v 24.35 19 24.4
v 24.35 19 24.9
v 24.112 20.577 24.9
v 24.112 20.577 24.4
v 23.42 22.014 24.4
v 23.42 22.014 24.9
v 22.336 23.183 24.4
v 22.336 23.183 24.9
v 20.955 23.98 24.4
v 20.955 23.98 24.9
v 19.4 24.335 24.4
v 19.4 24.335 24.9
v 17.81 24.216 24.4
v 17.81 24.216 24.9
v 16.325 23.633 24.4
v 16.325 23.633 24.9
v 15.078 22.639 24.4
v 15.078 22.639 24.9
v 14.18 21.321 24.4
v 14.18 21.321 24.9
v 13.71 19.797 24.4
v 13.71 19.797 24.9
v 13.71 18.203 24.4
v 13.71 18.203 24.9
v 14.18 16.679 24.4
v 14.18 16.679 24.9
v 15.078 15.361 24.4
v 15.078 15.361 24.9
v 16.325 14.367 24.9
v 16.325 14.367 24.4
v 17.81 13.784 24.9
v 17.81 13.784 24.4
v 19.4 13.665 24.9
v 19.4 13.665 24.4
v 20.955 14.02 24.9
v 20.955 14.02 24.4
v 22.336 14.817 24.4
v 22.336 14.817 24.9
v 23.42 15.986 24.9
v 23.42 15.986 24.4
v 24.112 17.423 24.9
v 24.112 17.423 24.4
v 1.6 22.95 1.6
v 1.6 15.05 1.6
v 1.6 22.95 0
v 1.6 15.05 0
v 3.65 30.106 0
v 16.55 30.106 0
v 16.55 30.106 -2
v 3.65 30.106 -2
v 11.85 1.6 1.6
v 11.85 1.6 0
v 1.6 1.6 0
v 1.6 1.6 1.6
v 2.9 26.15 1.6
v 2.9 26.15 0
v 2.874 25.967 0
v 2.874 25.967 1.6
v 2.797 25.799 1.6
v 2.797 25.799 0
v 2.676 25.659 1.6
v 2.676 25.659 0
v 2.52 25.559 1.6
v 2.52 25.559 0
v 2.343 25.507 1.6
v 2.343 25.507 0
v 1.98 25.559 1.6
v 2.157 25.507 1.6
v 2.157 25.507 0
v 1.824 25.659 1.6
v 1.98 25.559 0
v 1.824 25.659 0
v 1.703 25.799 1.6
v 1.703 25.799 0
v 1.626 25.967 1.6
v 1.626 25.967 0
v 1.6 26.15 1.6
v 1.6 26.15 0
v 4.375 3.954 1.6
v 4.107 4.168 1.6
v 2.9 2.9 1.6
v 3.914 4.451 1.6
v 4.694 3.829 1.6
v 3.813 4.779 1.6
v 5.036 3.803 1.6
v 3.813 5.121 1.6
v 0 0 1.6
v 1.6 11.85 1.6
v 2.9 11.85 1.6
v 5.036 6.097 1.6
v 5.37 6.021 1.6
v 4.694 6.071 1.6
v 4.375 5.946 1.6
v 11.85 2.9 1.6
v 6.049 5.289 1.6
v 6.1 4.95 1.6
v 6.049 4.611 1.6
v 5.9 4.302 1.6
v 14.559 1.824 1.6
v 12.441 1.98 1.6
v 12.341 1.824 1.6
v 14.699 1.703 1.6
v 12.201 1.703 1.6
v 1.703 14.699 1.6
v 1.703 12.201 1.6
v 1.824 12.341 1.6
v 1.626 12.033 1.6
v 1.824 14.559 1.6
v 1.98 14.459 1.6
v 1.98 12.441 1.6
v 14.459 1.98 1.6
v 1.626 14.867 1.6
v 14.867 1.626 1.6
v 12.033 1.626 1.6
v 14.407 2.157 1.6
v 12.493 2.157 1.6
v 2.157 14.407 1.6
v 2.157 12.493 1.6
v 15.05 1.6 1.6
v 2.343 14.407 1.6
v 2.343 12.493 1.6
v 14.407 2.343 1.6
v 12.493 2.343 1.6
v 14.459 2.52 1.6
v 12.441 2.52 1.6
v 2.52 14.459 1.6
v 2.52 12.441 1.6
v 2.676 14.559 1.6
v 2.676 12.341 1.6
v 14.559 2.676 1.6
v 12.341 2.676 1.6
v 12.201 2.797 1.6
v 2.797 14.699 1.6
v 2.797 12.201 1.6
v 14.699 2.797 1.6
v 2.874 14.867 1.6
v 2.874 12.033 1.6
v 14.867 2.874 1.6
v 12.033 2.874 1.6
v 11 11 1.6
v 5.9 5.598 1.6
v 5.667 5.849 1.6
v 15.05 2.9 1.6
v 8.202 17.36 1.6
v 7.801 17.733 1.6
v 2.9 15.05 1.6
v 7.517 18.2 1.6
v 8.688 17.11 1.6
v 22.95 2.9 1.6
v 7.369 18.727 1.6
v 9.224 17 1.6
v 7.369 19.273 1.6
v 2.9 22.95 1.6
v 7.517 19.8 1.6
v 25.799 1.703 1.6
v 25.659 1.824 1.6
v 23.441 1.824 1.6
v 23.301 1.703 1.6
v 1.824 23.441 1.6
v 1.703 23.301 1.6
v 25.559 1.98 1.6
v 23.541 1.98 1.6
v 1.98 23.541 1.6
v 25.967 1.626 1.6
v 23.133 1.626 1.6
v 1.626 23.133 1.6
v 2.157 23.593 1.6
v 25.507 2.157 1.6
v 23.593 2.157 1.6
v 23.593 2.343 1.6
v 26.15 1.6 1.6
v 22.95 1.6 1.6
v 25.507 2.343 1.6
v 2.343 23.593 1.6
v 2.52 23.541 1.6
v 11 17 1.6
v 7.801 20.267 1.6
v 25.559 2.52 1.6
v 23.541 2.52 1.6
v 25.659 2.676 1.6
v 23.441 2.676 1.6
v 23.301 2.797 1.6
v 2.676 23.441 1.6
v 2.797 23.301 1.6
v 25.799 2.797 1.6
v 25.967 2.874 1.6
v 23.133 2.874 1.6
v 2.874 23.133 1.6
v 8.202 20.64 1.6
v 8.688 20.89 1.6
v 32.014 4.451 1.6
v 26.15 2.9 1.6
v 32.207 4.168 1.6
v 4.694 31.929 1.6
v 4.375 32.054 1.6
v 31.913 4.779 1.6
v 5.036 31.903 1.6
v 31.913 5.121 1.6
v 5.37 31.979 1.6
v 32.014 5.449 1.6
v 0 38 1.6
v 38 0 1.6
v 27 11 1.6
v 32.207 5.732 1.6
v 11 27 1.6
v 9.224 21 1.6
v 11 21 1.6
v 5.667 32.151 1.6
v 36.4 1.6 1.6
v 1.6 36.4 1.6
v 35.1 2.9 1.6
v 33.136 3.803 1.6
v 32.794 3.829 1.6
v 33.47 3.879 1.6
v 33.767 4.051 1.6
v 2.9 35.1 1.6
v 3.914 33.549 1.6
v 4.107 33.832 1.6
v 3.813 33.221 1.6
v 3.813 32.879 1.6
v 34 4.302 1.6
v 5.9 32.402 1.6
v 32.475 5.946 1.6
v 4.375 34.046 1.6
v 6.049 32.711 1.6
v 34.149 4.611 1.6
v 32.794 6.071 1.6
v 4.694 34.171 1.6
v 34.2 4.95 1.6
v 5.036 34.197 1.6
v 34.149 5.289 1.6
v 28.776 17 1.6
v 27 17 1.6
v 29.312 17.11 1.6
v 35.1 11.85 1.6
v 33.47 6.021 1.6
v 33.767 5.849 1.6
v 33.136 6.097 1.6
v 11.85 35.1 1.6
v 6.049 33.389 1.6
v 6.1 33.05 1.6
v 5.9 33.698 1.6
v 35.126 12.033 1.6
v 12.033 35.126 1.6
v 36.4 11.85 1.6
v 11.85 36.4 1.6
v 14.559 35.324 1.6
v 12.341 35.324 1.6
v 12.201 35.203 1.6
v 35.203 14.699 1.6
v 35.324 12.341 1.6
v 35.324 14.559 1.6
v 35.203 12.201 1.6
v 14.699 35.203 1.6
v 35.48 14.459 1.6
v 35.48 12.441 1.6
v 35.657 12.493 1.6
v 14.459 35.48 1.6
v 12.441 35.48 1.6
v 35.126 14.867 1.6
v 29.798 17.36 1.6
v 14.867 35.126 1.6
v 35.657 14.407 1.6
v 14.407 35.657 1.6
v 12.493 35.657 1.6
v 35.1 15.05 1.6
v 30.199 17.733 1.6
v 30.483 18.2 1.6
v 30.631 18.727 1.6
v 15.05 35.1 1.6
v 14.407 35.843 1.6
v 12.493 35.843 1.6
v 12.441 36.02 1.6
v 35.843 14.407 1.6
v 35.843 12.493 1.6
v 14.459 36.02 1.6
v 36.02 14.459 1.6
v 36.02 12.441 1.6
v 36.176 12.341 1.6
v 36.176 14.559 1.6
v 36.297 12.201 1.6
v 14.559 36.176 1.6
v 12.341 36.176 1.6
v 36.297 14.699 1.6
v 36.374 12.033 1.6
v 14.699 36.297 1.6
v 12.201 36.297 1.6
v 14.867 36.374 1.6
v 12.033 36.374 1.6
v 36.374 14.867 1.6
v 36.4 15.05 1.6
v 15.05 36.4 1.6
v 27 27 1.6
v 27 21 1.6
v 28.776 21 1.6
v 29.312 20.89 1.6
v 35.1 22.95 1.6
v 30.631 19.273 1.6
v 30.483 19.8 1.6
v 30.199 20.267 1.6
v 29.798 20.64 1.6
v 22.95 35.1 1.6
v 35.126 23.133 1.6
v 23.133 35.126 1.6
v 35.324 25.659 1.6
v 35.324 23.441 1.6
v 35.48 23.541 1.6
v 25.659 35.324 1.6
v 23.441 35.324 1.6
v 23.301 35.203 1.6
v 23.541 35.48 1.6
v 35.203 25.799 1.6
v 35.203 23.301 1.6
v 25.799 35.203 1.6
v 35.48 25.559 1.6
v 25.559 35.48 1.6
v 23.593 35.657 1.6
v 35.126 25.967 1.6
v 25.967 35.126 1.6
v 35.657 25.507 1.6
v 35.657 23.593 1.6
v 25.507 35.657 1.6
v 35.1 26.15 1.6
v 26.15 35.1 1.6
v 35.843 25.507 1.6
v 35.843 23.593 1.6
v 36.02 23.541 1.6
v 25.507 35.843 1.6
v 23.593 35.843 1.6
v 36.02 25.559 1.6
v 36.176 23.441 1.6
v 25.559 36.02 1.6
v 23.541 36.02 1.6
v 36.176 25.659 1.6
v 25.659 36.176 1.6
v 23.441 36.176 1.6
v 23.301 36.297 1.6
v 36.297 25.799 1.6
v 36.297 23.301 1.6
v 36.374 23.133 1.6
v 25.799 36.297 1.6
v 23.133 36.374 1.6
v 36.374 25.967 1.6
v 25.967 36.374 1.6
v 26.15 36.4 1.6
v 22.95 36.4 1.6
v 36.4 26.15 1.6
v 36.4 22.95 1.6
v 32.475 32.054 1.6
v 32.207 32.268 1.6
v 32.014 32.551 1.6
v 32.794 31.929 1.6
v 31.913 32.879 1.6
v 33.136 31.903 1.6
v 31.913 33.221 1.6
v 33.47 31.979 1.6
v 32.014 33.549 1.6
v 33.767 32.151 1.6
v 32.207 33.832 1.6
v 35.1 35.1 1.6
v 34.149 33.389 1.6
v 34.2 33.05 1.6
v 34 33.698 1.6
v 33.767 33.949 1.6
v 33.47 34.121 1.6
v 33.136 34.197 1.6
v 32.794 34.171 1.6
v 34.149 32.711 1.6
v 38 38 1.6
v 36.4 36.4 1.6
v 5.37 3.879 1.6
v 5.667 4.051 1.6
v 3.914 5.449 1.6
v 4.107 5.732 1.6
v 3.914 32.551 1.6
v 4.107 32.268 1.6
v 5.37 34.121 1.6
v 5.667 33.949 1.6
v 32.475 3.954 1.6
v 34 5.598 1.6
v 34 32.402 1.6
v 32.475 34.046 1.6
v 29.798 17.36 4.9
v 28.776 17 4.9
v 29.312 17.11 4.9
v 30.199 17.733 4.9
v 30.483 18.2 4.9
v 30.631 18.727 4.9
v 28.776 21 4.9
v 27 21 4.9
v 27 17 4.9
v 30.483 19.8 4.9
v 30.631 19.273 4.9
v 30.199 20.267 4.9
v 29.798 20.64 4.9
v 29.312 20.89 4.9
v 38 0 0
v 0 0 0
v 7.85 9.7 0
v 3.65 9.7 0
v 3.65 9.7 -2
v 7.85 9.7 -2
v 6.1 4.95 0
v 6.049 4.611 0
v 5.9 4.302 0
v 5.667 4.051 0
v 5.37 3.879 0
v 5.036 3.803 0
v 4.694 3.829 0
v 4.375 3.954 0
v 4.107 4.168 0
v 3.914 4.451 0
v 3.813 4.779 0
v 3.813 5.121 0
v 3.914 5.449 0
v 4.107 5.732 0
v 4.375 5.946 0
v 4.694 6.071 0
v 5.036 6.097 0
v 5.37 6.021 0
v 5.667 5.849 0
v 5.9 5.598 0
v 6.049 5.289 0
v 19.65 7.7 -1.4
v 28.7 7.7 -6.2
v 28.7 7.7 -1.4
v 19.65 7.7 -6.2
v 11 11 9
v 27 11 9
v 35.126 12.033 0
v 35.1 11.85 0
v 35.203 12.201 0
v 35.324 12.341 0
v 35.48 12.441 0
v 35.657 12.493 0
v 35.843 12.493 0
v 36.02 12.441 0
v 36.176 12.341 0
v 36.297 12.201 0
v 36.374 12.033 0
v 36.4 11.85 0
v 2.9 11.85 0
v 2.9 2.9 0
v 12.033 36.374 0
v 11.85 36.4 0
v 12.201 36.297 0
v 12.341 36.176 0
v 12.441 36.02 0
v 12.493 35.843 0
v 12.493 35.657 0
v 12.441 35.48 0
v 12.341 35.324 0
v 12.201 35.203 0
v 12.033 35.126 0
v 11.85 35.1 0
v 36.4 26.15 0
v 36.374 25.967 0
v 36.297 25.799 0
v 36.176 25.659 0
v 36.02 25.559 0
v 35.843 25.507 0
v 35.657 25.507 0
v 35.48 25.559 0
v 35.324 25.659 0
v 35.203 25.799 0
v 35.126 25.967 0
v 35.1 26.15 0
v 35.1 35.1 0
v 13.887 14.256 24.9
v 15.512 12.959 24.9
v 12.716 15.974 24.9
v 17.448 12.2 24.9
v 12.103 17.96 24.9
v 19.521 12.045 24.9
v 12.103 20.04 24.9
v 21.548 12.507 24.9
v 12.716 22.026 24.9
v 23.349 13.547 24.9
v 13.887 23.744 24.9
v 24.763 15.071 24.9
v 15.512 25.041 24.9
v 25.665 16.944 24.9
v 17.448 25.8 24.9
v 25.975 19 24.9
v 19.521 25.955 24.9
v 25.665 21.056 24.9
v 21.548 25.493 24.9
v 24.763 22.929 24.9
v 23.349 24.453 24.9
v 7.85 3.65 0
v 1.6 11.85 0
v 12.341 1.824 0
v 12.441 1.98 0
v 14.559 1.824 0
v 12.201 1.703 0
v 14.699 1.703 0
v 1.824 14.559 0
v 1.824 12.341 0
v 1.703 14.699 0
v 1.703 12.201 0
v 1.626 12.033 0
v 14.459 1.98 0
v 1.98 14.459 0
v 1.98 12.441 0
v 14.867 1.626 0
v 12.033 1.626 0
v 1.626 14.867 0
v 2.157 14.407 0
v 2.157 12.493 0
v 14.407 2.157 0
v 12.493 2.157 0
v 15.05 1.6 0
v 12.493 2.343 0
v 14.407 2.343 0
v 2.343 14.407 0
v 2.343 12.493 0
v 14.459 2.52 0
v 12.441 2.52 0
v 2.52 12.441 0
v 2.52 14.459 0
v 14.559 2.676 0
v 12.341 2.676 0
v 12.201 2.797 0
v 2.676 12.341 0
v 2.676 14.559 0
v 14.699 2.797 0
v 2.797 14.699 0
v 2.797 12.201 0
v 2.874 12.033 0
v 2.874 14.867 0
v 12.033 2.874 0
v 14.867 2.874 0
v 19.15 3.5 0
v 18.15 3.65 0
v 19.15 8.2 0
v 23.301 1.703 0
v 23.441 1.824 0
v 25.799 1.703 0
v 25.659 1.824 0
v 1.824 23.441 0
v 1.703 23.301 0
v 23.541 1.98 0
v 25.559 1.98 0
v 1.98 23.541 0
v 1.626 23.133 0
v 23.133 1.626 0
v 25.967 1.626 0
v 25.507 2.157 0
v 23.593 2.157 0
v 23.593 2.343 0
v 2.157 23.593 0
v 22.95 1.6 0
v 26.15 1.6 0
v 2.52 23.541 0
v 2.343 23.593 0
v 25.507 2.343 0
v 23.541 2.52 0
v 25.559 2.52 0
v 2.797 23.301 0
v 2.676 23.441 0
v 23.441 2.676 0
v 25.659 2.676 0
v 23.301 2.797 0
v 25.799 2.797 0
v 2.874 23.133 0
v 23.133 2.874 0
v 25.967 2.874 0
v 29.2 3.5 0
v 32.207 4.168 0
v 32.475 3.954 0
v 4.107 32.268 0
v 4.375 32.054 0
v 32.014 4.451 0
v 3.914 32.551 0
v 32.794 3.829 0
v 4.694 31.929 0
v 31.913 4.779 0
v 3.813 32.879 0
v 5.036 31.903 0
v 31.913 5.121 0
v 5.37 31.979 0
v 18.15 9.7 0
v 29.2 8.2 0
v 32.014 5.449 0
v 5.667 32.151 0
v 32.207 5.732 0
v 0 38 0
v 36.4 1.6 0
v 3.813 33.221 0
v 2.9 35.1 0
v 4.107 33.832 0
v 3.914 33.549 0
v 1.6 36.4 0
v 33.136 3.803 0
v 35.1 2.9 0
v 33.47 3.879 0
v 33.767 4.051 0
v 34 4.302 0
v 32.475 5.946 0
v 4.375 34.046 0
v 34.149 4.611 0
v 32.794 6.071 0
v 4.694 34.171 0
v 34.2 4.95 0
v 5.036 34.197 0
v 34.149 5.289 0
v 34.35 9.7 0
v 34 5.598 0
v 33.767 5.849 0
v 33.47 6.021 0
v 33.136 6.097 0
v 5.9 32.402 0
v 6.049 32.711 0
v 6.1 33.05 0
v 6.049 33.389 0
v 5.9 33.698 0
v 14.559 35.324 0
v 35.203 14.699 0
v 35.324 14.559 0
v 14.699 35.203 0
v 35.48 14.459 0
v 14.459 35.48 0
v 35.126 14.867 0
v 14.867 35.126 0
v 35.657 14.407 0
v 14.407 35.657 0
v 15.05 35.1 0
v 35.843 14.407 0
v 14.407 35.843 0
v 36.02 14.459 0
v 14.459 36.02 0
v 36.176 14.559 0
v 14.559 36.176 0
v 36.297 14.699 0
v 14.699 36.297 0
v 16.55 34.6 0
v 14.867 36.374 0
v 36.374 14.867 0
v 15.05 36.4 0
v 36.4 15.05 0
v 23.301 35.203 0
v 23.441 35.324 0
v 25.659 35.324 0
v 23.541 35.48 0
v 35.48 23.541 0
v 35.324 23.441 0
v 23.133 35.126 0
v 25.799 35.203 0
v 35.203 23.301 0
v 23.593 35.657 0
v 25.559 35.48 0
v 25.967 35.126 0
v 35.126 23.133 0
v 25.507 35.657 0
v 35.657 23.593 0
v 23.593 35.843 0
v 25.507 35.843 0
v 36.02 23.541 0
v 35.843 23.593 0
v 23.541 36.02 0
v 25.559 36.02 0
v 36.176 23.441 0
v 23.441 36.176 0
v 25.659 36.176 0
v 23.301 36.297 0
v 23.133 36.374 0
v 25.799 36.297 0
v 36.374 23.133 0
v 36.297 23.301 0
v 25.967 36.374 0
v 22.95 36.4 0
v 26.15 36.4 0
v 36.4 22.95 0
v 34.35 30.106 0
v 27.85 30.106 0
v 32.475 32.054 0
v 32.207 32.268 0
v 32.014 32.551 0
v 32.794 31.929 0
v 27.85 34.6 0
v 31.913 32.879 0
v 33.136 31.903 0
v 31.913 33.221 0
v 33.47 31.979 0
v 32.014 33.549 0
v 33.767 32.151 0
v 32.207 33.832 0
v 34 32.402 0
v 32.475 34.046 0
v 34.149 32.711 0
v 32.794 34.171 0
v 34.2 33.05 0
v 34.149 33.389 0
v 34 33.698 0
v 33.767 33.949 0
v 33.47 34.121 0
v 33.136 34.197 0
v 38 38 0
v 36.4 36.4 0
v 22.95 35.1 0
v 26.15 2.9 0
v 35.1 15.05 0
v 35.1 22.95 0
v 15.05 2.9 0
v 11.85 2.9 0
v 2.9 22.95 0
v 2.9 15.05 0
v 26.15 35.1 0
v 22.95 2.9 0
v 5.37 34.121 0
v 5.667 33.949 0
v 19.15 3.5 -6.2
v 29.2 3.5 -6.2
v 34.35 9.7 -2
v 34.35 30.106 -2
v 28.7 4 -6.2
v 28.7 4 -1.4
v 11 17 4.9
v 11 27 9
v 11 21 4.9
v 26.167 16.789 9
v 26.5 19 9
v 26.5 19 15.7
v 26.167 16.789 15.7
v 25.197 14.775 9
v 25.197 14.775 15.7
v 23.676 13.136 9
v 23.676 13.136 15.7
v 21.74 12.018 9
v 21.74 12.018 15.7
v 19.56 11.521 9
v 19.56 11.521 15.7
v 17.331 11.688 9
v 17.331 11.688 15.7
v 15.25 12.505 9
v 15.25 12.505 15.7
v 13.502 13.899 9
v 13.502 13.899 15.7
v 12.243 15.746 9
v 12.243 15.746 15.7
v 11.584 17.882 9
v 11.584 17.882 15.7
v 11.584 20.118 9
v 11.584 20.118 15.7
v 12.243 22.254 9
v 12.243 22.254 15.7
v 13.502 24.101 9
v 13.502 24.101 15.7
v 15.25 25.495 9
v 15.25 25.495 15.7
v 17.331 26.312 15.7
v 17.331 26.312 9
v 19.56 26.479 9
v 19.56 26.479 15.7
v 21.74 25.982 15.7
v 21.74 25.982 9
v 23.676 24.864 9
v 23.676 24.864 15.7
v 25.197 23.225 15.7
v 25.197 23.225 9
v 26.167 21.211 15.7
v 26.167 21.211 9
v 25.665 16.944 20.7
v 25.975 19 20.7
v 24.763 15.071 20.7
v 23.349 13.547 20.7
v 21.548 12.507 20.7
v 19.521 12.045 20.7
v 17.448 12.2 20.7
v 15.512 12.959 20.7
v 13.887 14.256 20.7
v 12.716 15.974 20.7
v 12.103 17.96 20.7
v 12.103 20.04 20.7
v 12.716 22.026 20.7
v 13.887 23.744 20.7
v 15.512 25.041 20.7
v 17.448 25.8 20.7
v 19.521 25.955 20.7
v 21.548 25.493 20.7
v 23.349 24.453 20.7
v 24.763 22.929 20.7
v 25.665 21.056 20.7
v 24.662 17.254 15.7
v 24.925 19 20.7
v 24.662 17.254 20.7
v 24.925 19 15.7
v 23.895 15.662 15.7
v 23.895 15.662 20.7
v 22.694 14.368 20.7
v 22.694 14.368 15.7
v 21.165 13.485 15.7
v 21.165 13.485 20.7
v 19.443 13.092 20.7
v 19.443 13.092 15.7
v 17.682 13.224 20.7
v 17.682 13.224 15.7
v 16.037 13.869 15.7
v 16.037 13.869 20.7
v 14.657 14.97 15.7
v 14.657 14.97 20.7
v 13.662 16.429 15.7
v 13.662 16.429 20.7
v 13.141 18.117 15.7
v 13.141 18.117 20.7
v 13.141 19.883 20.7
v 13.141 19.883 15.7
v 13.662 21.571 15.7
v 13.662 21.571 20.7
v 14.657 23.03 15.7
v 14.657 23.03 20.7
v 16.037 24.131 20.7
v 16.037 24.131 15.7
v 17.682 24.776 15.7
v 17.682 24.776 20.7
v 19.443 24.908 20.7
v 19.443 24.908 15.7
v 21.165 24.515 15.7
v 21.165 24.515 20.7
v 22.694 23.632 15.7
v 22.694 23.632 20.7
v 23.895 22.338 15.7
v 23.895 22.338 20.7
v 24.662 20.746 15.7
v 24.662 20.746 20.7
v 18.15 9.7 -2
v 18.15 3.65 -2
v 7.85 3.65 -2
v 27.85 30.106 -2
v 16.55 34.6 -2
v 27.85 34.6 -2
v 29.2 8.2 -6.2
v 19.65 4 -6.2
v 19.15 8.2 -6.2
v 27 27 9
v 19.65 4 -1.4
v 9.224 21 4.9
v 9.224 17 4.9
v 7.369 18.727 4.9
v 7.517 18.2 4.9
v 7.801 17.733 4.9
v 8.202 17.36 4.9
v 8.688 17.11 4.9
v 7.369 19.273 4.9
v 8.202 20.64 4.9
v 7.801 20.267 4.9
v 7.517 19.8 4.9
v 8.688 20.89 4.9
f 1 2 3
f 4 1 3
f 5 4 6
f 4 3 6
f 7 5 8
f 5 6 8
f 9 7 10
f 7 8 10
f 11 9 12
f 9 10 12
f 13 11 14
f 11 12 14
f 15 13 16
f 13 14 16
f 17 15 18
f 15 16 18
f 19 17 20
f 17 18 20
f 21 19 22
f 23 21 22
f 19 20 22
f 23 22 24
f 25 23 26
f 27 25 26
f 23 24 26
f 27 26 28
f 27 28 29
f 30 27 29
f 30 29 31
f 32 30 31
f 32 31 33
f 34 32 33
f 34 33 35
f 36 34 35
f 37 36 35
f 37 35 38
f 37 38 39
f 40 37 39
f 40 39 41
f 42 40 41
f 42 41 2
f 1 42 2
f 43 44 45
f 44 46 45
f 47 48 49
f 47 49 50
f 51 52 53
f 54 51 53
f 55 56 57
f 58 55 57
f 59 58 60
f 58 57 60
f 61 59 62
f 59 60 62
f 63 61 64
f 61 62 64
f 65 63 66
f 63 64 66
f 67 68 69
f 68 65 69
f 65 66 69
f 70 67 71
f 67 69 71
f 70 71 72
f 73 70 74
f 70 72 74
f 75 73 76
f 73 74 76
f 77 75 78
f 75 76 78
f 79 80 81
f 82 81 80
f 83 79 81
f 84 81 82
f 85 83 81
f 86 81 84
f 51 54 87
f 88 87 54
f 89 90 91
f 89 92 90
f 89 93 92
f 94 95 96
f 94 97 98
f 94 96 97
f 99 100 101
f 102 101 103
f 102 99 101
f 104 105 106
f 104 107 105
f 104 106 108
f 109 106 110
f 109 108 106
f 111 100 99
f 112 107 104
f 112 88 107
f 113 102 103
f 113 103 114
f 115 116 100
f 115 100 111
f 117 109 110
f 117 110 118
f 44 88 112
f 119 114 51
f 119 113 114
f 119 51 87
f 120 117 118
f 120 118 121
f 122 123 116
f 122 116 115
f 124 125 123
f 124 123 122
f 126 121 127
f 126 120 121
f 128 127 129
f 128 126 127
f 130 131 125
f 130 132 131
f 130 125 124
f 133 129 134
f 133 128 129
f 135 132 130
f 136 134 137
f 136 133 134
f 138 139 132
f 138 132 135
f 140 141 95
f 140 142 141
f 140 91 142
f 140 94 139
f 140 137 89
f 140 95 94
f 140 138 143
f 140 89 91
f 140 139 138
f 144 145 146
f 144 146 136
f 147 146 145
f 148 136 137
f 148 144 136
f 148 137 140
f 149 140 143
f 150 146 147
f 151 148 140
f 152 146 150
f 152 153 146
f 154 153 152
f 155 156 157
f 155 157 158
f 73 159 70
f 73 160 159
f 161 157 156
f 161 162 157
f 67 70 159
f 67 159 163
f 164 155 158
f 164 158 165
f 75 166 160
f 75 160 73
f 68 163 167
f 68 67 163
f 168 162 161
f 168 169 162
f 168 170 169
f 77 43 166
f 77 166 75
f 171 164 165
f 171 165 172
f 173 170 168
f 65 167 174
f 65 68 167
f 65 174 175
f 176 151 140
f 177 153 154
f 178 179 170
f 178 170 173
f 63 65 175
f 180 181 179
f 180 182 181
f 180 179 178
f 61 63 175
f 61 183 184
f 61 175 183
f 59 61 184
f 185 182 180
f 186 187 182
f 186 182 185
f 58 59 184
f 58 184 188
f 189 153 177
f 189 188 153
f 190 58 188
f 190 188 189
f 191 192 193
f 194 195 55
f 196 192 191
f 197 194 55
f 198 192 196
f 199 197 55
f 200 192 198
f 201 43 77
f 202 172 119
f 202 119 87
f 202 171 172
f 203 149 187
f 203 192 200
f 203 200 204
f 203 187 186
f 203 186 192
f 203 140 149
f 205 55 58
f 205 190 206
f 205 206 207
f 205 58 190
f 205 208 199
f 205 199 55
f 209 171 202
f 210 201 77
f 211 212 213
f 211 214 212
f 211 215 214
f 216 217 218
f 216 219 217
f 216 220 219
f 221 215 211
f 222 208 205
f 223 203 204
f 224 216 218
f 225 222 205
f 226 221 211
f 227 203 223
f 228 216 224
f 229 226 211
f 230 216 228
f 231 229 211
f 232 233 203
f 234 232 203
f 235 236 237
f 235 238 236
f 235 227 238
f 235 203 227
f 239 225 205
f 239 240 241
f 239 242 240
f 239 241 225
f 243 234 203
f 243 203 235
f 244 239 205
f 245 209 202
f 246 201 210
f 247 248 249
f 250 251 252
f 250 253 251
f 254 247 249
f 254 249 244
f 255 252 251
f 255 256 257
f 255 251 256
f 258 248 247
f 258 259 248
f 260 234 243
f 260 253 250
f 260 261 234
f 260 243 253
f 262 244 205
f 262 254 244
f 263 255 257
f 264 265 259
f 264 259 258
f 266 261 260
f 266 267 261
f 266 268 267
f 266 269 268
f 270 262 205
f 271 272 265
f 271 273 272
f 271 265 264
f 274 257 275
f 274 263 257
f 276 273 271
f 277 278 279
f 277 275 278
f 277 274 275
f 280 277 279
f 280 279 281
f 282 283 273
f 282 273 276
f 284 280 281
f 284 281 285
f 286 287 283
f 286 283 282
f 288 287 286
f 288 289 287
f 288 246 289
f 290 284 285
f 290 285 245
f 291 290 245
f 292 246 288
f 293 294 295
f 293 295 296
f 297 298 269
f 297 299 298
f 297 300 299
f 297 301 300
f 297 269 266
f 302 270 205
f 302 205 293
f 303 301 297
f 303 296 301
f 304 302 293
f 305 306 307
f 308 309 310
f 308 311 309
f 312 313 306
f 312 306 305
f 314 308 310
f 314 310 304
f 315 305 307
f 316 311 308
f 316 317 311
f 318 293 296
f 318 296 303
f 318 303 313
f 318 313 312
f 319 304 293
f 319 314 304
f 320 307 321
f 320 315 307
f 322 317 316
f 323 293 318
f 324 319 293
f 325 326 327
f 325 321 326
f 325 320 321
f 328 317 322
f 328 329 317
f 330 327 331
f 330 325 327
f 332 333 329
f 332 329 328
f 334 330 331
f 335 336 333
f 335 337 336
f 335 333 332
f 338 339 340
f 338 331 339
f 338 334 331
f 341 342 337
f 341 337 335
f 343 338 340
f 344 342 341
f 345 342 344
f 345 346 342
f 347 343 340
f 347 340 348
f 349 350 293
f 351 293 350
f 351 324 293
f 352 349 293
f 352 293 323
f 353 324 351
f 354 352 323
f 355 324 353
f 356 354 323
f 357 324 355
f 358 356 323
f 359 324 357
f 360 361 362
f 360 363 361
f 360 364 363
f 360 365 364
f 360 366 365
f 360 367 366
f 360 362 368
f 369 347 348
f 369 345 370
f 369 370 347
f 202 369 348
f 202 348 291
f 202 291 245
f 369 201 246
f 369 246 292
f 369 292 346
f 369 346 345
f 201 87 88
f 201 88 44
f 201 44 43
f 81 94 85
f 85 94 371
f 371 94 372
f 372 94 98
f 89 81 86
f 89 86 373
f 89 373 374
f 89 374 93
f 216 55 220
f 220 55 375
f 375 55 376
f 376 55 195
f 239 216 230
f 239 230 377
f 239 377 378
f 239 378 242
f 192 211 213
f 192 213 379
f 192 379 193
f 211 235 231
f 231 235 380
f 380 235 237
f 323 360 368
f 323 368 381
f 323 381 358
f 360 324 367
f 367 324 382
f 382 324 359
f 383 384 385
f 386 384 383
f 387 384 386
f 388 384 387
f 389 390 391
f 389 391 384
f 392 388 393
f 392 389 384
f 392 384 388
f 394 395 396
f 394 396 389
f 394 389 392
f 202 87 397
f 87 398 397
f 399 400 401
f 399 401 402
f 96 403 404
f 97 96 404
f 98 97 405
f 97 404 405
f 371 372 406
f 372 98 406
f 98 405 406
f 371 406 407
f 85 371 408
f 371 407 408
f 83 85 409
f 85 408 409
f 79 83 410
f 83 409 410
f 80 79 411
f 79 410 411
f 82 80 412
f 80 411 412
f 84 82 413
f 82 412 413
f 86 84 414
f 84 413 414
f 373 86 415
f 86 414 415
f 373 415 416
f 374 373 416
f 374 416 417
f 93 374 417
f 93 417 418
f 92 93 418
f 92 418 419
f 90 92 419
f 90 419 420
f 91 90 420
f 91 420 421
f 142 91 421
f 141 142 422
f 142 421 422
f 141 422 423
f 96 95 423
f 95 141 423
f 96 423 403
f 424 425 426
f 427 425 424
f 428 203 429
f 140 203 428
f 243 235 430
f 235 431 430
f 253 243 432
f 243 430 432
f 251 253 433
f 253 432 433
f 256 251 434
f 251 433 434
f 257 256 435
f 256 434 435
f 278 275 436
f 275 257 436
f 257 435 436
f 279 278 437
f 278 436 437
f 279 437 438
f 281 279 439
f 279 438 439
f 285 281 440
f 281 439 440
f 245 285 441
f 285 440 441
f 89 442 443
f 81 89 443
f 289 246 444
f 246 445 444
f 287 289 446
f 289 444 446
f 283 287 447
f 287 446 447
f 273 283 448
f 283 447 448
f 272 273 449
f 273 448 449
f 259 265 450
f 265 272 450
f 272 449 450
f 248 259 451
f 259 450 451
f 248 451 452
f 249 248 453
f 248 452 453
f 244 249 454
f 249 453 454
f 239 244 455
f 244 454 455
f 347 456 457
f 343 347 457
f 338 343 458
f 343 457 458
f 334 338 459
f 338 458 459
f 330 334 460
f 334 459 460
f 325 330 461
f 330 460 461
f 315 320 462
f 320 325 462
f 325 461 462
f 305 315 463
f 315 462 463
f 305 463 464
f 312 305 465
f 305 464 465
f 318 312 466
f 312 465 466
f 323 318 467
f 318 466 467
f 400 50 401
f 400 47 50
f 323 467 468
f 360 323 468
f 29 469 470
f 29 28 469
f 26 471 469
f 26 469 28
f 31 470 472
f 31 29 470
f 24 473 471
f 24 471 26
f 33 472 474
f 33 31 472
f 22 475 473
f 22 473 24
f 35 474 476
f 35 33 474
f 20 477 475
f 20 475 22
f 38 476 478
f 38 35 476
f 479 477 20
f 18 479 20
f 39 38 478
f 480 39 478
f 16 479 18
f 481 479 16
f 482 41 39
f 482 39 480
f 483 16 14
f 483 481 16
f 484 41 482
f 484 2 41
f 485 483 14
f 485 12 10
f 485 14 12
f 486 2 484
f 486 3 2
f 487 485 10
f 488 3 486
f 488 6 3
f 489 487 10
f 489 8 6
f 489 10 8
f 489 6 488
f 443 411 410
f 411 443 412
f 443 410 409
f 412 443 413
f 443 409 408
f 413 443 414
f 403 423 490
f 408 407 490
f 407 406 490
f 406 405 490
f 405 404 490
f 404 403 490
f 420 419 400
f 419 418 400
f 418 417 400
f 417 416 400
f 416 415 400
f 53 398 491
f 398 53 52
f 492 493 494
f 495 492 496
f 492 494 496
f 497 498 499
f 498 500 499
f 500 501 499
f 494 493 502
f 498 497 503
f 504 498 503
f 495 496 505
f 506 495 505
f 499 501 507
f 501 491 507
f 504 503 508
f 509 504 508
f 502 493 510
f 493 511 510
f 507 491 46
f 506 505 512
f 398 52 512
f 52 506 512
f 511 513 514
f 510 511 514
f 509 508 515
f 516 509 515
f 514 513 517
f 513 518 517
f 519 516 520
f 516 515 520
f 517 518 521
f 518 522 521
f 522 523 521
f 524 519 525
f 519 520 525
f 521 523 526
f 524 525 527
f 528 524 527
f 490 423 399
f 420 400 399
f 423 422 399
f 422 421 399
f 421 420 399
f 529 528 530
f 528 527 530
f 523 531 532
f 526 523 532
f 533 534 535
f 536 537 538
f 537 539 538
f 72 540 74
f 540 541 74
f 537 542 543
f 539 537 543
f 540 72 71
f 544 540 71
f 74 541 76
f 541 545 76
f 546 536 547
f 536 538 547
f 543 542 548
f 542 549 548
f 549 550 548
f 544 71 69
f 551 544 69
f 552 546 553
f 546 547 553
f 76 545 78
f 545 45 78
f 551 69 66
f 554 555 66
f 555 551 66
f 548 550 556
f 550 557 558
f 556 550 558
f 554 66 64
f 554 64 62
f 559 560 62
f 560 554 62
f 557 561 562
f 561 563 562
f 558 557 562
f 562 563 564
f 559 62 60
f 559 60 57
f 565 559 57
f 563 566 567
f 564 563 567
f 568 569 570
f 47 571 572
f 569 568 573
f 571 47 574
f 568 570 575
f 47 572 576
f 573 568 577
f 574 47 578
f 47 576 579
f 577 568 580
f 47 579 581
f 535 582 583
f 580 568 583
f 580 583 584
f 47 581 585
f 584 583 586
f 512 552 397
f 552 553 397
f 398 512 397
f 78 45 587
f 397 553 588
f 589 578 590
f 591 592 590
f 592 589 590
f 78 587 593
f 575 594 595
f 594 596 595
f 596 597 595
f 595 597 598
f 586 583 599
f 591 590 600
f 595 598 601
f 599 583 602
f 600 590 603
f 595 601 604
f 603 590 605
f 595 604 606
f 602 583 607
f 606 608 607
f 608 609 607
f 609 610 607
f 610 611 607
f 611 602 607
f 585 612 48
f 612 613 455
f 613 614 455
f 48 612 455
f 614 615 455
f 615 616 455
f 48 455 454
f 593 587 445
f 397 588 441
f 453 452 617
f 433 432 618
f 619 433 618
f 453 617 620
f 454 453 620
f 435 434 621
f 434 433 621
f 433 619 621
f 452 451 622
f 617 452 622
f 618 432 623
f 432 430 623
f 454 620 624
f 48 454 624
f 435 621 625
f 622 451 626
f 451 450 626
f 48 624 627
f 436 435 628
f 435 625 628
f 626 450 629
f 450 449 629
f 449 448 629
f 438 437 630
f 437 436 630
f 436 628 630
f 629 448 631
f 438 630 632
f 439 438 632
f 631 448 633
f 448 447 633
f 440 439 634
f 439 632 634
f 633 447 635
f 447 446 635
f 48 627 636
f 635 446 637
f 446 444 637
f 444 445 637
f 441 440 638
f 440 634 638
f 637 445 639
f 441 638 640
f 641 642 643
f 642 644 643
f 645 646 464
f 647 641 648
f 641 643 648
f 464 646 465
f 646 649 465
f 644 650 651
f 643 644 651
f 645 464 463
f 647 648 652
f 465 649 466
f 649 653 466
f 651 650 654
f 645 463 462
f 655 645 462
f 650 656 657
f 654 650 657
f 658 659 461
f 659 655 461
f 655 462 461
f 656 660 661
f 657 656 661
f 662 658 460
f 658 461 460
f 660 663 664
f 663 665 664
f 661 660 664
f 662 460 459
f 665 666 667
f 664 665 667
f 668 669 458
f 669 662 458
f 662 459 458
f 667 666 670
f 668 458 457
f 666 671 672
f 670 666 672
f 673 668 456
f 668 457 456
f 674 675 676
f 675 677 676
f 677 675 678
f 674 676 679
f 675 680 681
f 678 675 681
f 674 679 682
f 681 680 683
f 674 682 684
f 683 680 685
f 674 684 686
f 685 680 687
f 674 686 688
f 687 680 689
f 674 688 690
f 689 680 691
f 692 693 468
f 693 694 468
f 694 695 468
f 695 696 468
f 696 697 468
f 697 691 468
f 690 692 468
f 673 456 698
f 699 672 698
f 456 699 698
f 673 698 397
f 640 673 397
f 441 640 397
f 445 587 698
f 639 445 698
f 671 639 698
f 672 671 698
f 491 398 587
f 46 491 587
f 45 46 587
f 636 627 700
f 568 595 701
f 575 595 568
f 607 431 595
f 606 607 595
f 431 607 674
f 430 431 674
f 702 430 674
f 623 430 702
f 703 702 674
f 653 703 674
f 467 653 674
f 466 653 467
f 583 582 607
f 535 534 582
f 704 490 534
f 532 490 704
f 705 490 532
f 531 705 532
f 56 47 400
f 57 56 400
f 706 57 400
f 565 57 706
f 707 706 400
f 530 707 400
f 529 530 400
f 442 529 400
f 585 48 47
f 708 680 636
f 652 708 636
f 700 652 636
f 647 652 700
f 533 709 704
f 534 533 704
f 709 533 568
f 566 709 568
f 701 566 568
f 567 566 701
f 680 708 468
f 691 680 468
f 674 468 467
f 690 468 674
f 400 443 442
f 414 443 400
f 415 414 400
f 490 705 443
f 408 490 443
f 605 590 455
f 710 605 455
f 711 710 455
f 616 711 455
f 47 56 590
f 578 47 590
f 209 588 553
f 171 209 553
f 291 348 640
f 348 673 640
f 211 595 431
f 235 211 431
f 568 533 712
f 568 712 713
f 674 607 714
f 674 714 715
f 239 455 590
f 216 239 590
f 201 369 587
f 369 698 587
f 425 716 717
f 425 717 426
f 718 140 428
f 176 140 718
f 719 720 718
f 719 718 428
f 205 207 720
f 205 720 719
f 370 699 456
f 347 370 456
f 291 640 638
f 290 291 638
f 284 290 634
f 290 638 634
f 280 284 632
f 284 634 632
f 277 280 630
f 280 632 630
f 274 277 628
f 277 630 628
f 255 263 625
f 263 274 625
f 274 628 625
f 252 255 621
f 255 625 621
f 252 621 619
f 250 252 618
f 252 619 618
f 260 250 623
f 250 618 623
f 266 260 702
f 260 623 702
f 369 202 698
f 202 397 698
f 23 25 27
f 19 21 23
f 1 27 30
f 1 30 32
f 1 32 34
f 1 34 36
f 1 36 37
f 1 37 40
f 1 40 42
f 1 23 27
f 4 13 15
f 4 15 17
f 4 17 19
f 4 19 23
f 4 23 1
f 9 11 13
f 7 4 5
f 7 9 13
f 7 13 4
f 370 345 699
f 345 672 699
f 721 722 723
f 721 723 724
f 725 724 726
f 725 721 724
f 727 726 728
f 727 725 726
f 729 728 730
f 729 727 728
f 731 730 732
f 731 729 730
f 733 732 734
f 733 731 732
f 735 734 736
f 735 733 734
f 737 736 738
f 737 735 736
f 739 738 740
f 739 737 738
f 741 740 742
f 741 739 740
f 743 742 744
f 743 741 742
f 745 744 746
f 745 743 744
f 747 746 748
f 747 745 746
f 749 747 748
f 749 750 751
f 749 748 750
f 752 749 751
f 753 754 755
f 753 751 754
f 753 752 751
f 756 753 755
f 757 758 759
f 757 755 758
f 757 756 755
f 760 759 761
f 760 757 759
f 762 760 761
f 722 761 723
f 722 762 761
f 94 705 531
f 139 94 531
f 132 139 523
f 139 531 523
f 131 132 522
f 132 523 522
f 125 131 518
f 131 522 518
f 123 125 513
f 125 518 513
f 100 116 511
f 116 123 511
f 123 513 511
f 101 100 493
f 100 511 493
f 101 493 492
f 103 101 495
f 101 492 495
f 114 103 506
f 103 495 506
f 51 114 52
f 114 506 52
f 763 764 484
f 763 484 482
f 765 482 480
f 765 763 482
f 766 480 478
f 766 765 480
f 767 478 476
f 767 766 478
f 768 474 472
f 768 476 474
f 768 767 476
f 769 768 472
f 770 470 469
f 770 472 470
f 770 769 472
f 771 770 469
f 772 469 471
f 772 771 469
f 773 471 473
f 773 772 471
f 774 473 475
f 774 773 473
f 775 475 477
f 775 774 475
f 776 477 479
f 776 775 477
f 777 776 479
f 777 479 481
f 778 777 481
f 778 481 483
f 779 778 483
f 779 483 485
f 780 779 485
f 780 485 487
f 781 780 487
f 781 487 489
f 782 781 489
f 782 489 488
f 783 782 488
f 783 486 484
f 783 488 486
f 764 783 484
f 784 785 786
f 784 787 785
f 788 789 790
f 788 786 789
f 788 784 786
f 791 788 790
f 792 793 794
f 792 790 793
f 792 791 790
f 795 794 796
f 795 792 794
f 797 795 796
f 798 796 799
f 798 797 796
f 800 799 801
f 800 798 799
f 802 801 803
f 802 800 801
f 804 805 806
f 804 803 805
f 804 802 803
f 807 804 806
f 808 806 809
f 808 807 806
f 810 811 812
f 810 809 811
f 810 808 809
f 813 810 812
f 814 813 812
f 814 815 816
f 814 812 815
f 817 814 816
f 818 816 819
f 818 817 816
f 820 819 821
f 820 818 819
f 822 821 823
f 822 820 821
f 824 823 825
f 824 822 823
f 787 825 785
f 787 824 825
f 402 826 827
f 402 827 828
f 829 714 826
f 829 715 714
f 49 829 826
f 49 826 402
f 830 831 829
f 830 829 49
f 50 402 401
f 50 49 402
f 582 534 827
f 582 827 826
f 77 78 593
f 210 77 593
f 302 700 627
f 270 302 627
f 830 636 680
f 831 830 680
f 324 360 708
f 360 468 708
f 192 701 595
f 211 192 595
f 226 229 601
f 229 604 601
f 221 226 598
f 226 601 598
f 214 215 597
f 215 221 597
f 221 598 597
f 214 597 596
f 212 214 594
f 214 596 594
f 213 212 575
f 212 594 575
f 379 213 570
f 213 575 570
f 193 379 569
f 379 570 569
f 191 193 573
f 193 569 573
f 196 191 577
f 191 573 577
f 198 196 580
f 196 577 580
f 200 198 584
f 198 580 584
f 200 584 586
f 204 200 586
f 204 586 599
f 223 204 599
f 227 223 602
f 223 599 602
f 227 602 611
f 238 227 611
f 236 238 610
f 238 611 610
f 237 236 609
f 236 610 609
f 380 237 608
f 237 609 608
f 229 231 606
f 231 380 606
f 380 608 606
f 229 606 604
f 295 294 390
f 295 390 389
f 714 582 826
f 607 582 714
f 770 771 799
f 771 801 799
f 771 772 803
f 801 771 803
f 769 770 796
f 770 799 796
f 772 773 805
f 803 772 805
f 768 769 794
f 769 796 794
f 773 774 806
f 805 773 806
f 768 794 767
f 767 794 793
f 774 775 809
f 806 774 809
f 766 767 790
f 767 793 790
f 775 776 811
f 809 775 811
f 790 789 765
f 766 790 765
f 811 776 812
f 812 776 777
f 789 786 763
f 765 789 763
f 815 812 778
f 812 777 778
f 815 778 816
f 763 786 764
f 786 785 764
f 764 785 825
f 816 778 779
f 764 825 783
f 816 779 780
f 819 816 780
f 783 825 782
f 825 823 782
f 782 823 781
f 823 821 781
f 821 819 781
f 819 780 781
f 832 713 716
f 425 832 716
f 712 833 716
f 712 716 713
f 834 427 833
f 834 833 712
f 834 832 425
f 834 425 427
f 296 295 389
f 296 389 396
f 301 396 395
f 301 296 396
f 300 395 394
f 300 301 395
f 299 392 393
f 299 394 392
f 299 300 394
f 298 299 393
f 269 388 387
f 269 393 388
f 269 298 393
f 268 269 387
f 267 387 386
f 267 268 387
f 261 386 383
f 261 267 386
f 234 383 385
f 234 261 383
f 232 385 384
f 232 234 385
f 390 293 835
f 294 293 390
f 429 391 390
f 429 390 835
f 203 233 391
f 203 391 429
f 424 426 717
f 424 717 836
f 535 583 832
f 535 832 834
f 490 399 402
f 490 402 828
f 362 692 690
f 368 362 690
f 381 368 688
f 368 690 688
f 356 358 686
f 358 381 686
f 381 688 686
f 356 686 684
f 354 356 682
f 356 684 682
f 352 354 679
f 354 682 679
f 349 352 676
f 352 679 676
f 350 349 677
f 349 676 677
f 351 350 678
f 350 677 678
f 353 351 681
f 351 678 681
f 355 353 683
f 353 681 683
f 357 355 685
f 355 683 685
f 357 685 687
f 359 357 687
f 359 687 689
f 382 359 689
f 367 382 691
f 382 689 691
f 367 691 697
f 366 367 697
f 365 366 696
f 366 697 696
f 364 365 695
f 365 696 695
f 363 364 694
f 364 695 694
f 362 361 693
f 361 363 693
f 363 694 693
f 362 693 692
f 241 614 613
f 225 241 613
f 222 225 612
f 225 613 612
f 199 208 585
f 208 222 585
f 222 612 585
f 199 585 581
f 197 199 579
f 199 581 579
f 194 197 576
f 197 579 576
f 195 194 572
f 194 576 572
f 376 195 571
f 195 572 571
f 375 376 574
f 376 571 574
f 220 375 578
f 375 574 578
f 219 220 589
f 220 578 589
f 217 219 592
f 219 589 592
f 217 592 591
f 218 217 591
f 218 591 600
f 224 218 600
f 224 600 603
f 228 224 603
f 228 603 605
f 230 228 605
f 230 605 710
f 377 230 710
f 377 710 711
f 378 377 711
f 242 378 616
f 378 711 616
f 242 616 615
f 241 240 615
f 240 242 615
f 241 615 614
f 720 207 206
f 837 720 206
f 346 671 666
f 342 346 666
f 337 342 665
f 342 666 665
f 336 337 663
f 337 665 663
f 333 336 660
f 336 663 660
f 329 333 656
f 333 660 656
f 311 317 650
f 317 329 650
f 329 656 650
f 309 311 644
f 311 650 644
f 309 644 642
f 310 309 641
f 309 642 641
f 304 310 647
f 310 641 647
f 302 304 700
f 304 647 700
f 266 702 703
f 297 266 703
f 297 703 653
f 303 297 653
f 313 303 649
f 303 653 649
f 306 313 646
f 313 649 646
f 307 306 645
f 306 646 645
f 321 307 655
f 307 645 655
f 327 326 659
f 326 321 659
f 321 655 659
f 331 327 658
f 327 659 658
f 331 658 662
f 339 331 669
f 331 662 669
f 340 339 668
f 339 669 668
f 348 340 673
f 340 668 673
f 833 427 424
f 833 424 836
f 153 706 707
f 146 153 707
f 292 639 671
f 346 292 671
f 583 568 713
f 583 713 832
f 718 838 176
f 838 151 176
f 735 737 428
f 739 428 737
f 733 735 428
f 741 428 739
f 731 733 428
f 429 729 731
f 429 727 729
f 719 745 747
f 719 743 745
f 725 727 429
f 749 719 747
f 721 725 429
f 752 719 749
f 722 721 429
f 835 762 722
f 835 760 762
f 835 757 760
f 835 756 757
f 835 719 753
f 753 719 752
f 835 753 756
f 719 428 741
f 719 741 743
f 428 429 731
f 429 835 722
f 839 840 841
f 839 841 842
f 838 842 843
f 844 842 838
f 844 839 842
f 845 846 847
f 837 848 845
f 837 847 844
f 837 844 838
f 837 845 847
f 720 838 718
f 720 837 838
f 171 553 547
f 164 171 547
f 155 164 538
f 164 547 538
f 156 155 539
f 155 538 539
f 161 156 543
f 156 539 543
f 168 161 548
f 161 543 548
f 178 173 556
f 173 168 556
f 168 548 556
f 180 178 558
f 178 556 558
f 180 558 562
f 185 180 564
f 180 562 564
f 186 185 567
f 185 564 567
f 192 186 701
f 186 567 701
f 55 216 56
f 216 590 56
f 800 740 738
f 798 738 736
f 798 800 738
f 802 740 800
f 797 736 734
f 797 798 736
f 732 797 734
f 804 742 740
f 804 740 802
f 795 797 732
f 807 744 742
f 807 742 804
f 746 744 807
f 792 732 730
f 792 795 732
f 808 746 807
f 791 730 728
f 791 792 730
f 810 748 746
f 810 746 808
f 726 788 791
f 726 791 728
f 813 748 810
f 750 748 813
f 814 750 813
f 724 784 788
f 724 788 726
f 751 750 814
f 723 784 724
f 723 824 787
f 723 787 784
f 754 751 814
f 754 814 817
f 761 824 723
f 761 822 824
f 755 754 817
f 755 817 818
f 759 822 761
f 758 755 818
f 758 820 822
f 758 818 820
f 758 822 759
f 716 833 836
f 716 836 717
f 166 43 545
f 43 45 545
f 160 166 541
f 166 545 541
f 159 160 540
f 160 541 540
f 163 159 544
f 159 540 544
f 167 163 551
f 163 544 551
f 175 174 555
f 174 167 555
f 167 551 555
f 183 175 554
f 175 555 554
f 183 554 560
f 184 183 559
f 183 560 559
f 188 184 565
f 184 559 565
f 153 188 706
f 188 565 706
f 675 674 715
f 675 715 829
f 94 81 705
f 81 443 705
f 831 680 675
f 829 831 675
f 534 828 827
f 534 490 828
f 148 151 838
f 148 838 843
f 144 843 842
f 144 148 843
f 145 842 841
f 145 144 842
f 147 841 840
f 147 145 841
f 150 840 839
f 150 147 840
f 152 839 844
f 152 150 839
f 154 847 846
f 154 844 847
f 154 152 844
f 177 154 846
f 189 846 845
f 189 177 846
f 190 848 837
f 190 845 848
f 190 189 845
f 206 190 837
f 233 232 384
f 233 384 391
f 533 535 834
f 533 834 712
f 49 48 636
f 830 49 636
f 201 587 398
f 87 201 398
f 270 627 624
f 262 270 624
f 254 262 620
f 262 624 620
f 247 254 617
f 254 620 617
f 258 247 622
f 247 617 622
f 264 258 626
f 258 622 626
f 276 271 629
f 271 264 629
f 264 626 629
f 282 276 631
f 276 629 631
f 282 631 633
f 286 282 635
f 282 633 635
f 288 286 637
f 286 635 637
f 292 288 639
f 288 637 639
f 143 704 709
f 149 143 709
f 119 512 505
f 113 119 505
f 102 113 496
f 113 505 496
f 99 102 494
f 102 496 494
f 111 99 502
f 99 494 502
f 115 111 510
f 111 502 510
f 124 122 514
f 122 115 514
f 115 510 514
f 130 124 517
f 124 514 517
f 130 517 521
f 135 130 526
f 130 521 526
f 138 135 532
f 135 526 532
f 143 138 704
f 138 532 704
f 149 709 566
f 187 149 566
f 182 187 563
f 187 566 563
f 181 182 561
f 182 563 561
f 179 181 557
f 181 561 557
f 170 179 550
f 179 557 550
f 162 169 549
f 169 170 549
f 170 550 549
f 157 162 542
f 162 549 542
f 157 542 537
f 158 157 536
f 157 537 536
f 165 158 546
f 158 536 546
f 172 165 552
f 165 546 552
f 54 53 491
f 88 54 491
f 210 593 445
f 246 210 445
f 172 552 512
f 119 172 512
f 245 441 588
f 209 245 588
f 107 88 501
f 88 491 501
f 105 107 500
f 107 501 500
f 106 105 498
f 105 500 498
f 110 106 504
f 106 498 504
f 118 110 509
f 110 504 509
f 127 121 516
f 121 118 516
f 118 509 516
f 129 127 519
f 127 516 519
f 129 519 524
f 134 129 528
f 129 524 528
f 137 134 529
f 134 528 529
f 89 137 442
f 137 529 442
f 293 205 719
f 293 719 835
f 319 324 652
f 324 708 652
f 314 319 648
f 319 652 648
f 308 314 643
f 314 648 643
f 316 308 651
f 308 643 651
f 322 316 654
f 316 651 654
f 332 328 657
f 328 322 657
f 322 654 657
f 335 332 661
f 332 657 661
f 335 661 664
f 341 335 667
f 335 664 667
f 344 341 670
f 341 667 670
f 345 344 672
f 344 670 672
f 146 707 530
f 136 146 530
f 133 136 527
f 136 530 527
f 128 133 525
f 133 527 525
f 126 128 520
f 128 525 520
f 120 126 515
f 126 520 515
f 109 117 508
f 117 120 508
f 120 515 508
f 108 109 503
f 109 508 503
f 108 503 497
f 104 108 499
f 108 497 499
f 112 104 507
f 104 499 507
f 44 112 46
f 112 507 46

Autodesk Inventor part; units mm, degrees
ref_plane "YZ Plane" through (0, 0, 0) normal (1, 0, 0) x (0, 1, 0)
ref_plane "XZ Plane" through (0, 0, 0) normal (0, 1, 0) x (-1, 0, 0)
ref_plane "XY Plane" through (0, 0, 0) normal (0, 0, 1) x (1, 0, 0)
sketch "Sketch1" plane through (0, 0, 0) normal (0, 0, 1) x (1, 0, 0)
  line L0 (0, 0) -> (38, 0)
  line L1 (38, 0) -> (38, 38)
  line L2 (38, 38) -> (0, 38)
  line L3 (0, 38) -> (0, 0)
  line L4 (35.1, 35.1) -> (2.9, 35.1)
  line L5 (0, 38) -> (38, 0) construction
  line L6 (38, 38) -> (0, 0) construction
  line L7 (19, 0) -> (19, 38) construction
  line L8 (0, 19) -> (38, 19) construction
  arc A0 (11.85, 1.6) -> (11.85, 2.9) centre (11.85, 2.25) ccw
  arc A1 (15.05, 2.9) -> (15.05, 1.6) centre (15.05, 2.25) ccw
  arc A2 (22.95, 1.6) -> (22.95, 2.9) centre (22.95, 2.25) ccw
  arc A3 (26.15, 2.9) -> (26.15, 1.6) centre (26.15, 2.25) ccw
  line L9 (2.9, 2.9) -> (11.85, 2.9)
  line L10 (11.85, 1.6) -> (1.6, 1.6)
  line L11 (36.4, 1.6) -> (26.15, 1.6)
  line L12 (22.95, 1.6) -> (15.05, 1.6)
  line L13 (15.05, 2.9) -> (22.95, 2.9)
  line L14 (26.15, 2.9) -> (35.1, 2.9)
  arc A4 (35.1, 26.15) -> (36.4, 26.15) centre (35.75, 26.15) ccw
  line L15 (35.1, 15.05) -> (35.1, 22.95)
  arc A5 (36.4, 22.95) -> (35.1, 22.95) centre (35.75, 22.95) ccw
  line L16 (36.4, 22.95) -> (36.4, 15.05)
  line L17 (36.4, 11.85) -> (36.4, 1.6)
  arc A6 (36.4, 11.85) -> (35.1, 11.85) centre (35.75, 11.85) ccw
  arc A7 (35.1, 15.05) -> (36.4, 15.05) centre (35.75, 15.05) ccw
  line L18 (35.1, 26.15) -> (35.1, 35.1)
  line L19 (36.4, 36.4) -> (36.4, 26.15)
  line L20 (35.1, 2.9) -> (35.1, 11.85)
  arc A8 (11.85, 35.1) -> (11.85, 36.4) centre (11.85, 35.75) ccw
  line L21 (22.95, 35.1) -> (15.05, 35.1)
  arc A9 (15.05, 36.4) -> (15.05, 35.1) centre (15.05, 35.75) ccw
  line L22 (15.05, 36.4) -> (22.95, 36.4)
  line L23 (26.15, 36.4) -> (36.4, 36.4)
  arc A10 (26.15, 36.4) -> (26.15, 35.1) centre (26.15, 35.75) ccw
  arc A11 (22.95, 35.1) -> (22.95, 36.4) centre (22.95, 35.75) ccw
  line L24 (11.85, 35.1) -> (2.9, 35.1)
  line L25 (1.6, 36.4) -> (11.85, 36.4)
  line L26 (35.1, 35.1) -> (26.15, 35.1)
  arc A12 (2.9, 11.85) -> (1.6, 11.85) centre (2.25, 11.85) ccw
  line L27 (2.9, 22.95) -> (2.9, 15.05)
  arc A13 (1.6, 15.05) -> (2.9, 15.05) centre (2.25, 15.05) ccw
  line L28 (1.6, 15.05) -> (1.6, 22.95)
  line L29 (1.6, 26.15) -> (1.6, 36.4)
  arc A14 (1.6, 26.15) -> (2.9, 26.15) centre (2.25, 26.15) ccw
  arc A15 (2.9, 22.95) -> (1.6, 22.95) centre (2.25, 22.95) ccw
  line L30 (2.9, 11.85) -> (2.9, 2.9)
  line L31 (1.6, 1.6) -> (1.6, 11.85)
  line L32 (2.9, 35.1) -> (2.9, 26.15)
  circle A16 centre (33.05, 4.95) radius 1.15
  line L33 (3.8, 34.2) -> (34.2, 34.2) construction
  line L34 (34.2, 34.2) -> (34.2, 3.8) construction
  line L35 (34.2, 3.8) -> (3.8, 3.8) construction
  line L36 (3.8, 3.8) -> (3.8, 34.2) construction
  circle A17 centre (4.95, 4.95) radius 1.15
  circle A18 centre (33.05, 33.05) radius 1.15
  circle A19 centre (4.95, 33.05) radius 1.15
  point P0 (23.6, 2.25)
  point P1 (14.4, 2.25)
  point P2 (25.5, 2.25)
  point P3 (12.5, 2.25)
  point P4 (19, 19)
  point P5 (35.75, 25.5)
  point P6 (35.75, 23.6)
  point P7 (35.75, 12.5)
  point P8 (35.75, 14.4)
  point P9 (12.5, 35.75)
  point P10 (14.4, 35.75)
  point P11 (25.5, 35.75)
  point P12 (23.6, 35.75)
  point P13 (2.25, 12.5)
  point P14 (2.25, 14.4)
  point P15 (2.25, 25.5)
  point P16 (2.25, 23.6)
  point P17 (2.9, 35.1)
  point P18 (26.15, 35.1)
  dimension "d0" = 38
  dimension "d1" = 38
  dimension "d4" = 9.2
  dimension "d5" = 13
  dimension "d8" = 360
  dimension "d10" = 2.3
  dimension "d11" = 0.9
extrude "Extrusion1" add sketch "Sketch1" along normal blind 1.6
sketch "Sketch2" plane through (0, 0, 1.6) normal (0, 0, 1) x (1, 0, 0)
  line L0 (11, 27) -> (27, 27)
  line L1 (27, 27) -> (27, 11)
  line L2 (27, 11) -> (11, 11)
  line L3 (11, 11) -> (11, 27)
  line L4 (38, 38) -> (0, 38) construction
  line L5 (19, 38) -> (19, 0) construction
  line L6 (0, 0) -> (38, 0) construction
  line L7 (38, 0) -> (38, 38) construction
  line L8 (38, 19) -> (0, 19) construction
  line L9 (0, 38) -> (0, 0) construction
  dimension "d14" = 16
  dimension "d15" = 16
extrude "Extrusion2" add sketch "Sketch2" along normal blind 7.4
sketch "Sketch3" plane through (0, 0, 1.6) normal (0, 0, 1) x (1, 0, 0)
  line L0 (38, 38) -> (0, 38) construction
  line L1 (19, 38) -> (19, 0) construction
  line L2 (0, 0) -> (38, 0) construction
  line L3 (27, 11) -> (27, 27) projected
  line L4 (27, 21) -> (28.7765, 21)
  line L5 (28.7765, 17) -> (27, 17)
  line L6 (27, 17) -> (27, 21)
  arc A0 (28.7765, 17) -> (28.7765, 21) centre (28.6457, 19) ccw
  line L7 (0, 38) -> (0, 0) construction
  line L8 (0, 19) -> (38, 19) construction
  line L9 (38, 0) -> (38, 38) construction
  line L10 (11, 11) -> (11, 27)
  line L11 (11, 21) -> (9.2235, 21)
  line L12 (9.2235, 17) -> (11, 17)
  line L13 (11, 17) -> (11, 21)
  arc A1 (9.2235, 21) -> (9.2235, 17) centre (9.3543, 19) ccw
  line L14 (38, 19) -> (0, 19) construction
  point P0 (27.8883, 21)
  point P1 (10.1117, 21)
  point P2 (30.65, 19)
  point P3 (7.35, 19)
  dimension "d18" = 4
  dimension "d19" = 23.3
extrude "Extrusion3" add sketch "Sketch3" along normal blind 3.3
sketch "Sketch4" plane through (0, 0, 9) normal (0, 0, 1) x (1, 0, 0)
  line L0 (27, 27) -> (11, 27) construction
  line L1 (19, 27) -> (19, 11) construction
  line L2 (27, 11) -> (11, 11) construction
  line L3 (27, 11) -> (27, 27) construction
  line L4 (27, 19) -> (11, 19) construction
  line L5 (11, 27) -> (11, 11) construction
  circle A0 centre (19, 19) radius 7.5
  point P0 (0, 0)
  dimension "d22" = 15
extrude "Extrusion4" add sketch "Sketch4" along normal blind 6.7
sketch "Sketch5" plane through (19, 19, 15.7) normal (0, 0, 1) x (1, 0, 0)
  circle A0 centre (0, 0) radius 7.5 projected
  circle A1 centre (0, 0) radius 5.925
  point P0 (-19, -19)
  dimension "d25" = 11.85
extrude "Extrusion5" add sketch "Sketch5" along normal blind 5 contours A1
sketch "Sketch6" plane through (19, 19, 20.7) normal (0, 0, 1) x (1, 0, 0)
  circle A0 centre (0, 0) radius 5.925 projected
  circle A1 centre (0, 0) radius 6.975
  point P0 (-19, -19)
  dimension "d28" = 13.95
extrude "Extrusion6" add sketch "Sketch6" along normal blind 4.2 contours A0 | A1
sketch "Sketch7" plane through (19, 19, 24.9) normal (0, 0, 1) x (1, 0, 0)
  circle A0 centre (0, 0) radius 6.975 projected
  circle A1 centre (0, 0) radius 5.35
  point P0 (-19, -19)
  dimension "d31" = 10.7
extrude "Extrusion7" cut sketch "Sketch7" against normal blind 0.5 contours A1
sketch "Sketch8" plane through (0, 0, 0) normal (0, 0, -1) x (-1, 0, 0)
  line L0 (-29.2, 8.2) -> (-19.15, 8.2)
  line L1 (-19.15, 8.2) -> (-19.15, 3.5)
  line L2 (-19.15, 3.5) -> (-29.2, 3.5)
  line L3 (-29.2, 3.5) -> (-29.2, 8.2)
  line L4 (-38, 0) -> (-38, 38) projected
  line L5 (0, 0) -> (-38, 0) projected
  dimension "d34" = 10.05
  dimension "d35" = 4.7
  dimension "d36" = 8.8
  dimension "d37" = 3.5
extrude "Extrusion8" add sketch "Sketch8" along normal blind 6.2
sketch "Sketch9" plane through (0, 0, -6.2) normal (0, 0, -1) x (-1, 0, 0)
  line L0 (-29.2, 3.5) -> (-19.15, 3.5) projected
  line L1 (-19.15, 3.5) -> (-19.15, 8.2) projected
  line L2 (-19.15, 8.2) -> (-29.2, 8.2) projected
  line L3 (-29.2, 8.2) -> (-29.2, 3.5) projected
  line L4 (-28.7, 7.7) -> (-19.65, 7.7)
  line L5 (-19.65, 7.7) -> (-19.65, 4)
  line L6 (-19.65, 4) -> (-28.7, 4)
  line L7 (-28.7, 4) -> (-28.7, 7.7)
  point P0 (0, 0)
  dimension "d40" = 0.5
extrude "Extrusion9" cut sketch "Sketch9" against normal blind 4.8 contours L4 L5 L6 L7
sketch "Sketch10" plane through (0, 0, 0) normal (0, 0, -1) x (-1, 0, 0)
  line L0 (-34.35, 30.1061) -> (-3.65, 30.1061)
  line L1 (-3.65, 30.1061) -> (-3.65, 9.7)
  line L2 (-3.65, 9.7) -> (-34.35, 9.7)
  line L3 (-34.35, 9.7) -> (-34.35, 30.1061)
  line L4 (-2.9, 22.95) -> (-2.9, 15.05) projected
  line L5 (-35.1, 15.05) -> (-35.1, 22.95) projected
  line L6 (-35.1, 35.1) -> (-26.15, 35.1) projected
  line L7 (-27.85, 30.1061) -> (-16.55, 30.1061)
  line L8 (-16.55, 30.1061) -> (-16.55, 34.6)
  line L9 (-16.55, 34.6) -> (-27.85, 34.6)
  line L10 (-27.85, 34.6) -> (-27.85, 30.1061)
  line L11 (-18.15, 9.7) -> (-7.85, 9.7)
  line L12 (-7.85, 9.7) -> (-7.85, 3.65)
  line L13 (-7.85, 3.65) -> (-18.15, 3.65)
  line L14 (-18.15, 3.65) -> (-18.15, 9.7)
  line L15 (-19.15, 8.2) -> (-29.2, 8.2) projected
  line L16 (-19.15, 3.5) -> (-19.15, 8.2) projected
  line L17 (-15.05, 2.9) -> (-22.95, 2.9) projected
  line L18 (-22.95, 35.1) -> (-15.05, 35.1) projected
  line L19 (-38, 0) -> (-38, 38) projected
  point P0 (0, 0)
  dimension "d43" = 0.75
  dimension "d44" = 0.75
  dimension "d45" = 4.9939
  dimension "d46" = 1.5
  dimension "d47" = 1
  dimension "d48" = 0.75
  dimension "d49" = 10.3
  dimension "d50" = 0.5
  dimension "d51" = 10.15
  dimension "d52" = 11.3
extrude "Extrusion10" add sketch "Sketch10" along normal blind 2
properties part number "Camera2"
